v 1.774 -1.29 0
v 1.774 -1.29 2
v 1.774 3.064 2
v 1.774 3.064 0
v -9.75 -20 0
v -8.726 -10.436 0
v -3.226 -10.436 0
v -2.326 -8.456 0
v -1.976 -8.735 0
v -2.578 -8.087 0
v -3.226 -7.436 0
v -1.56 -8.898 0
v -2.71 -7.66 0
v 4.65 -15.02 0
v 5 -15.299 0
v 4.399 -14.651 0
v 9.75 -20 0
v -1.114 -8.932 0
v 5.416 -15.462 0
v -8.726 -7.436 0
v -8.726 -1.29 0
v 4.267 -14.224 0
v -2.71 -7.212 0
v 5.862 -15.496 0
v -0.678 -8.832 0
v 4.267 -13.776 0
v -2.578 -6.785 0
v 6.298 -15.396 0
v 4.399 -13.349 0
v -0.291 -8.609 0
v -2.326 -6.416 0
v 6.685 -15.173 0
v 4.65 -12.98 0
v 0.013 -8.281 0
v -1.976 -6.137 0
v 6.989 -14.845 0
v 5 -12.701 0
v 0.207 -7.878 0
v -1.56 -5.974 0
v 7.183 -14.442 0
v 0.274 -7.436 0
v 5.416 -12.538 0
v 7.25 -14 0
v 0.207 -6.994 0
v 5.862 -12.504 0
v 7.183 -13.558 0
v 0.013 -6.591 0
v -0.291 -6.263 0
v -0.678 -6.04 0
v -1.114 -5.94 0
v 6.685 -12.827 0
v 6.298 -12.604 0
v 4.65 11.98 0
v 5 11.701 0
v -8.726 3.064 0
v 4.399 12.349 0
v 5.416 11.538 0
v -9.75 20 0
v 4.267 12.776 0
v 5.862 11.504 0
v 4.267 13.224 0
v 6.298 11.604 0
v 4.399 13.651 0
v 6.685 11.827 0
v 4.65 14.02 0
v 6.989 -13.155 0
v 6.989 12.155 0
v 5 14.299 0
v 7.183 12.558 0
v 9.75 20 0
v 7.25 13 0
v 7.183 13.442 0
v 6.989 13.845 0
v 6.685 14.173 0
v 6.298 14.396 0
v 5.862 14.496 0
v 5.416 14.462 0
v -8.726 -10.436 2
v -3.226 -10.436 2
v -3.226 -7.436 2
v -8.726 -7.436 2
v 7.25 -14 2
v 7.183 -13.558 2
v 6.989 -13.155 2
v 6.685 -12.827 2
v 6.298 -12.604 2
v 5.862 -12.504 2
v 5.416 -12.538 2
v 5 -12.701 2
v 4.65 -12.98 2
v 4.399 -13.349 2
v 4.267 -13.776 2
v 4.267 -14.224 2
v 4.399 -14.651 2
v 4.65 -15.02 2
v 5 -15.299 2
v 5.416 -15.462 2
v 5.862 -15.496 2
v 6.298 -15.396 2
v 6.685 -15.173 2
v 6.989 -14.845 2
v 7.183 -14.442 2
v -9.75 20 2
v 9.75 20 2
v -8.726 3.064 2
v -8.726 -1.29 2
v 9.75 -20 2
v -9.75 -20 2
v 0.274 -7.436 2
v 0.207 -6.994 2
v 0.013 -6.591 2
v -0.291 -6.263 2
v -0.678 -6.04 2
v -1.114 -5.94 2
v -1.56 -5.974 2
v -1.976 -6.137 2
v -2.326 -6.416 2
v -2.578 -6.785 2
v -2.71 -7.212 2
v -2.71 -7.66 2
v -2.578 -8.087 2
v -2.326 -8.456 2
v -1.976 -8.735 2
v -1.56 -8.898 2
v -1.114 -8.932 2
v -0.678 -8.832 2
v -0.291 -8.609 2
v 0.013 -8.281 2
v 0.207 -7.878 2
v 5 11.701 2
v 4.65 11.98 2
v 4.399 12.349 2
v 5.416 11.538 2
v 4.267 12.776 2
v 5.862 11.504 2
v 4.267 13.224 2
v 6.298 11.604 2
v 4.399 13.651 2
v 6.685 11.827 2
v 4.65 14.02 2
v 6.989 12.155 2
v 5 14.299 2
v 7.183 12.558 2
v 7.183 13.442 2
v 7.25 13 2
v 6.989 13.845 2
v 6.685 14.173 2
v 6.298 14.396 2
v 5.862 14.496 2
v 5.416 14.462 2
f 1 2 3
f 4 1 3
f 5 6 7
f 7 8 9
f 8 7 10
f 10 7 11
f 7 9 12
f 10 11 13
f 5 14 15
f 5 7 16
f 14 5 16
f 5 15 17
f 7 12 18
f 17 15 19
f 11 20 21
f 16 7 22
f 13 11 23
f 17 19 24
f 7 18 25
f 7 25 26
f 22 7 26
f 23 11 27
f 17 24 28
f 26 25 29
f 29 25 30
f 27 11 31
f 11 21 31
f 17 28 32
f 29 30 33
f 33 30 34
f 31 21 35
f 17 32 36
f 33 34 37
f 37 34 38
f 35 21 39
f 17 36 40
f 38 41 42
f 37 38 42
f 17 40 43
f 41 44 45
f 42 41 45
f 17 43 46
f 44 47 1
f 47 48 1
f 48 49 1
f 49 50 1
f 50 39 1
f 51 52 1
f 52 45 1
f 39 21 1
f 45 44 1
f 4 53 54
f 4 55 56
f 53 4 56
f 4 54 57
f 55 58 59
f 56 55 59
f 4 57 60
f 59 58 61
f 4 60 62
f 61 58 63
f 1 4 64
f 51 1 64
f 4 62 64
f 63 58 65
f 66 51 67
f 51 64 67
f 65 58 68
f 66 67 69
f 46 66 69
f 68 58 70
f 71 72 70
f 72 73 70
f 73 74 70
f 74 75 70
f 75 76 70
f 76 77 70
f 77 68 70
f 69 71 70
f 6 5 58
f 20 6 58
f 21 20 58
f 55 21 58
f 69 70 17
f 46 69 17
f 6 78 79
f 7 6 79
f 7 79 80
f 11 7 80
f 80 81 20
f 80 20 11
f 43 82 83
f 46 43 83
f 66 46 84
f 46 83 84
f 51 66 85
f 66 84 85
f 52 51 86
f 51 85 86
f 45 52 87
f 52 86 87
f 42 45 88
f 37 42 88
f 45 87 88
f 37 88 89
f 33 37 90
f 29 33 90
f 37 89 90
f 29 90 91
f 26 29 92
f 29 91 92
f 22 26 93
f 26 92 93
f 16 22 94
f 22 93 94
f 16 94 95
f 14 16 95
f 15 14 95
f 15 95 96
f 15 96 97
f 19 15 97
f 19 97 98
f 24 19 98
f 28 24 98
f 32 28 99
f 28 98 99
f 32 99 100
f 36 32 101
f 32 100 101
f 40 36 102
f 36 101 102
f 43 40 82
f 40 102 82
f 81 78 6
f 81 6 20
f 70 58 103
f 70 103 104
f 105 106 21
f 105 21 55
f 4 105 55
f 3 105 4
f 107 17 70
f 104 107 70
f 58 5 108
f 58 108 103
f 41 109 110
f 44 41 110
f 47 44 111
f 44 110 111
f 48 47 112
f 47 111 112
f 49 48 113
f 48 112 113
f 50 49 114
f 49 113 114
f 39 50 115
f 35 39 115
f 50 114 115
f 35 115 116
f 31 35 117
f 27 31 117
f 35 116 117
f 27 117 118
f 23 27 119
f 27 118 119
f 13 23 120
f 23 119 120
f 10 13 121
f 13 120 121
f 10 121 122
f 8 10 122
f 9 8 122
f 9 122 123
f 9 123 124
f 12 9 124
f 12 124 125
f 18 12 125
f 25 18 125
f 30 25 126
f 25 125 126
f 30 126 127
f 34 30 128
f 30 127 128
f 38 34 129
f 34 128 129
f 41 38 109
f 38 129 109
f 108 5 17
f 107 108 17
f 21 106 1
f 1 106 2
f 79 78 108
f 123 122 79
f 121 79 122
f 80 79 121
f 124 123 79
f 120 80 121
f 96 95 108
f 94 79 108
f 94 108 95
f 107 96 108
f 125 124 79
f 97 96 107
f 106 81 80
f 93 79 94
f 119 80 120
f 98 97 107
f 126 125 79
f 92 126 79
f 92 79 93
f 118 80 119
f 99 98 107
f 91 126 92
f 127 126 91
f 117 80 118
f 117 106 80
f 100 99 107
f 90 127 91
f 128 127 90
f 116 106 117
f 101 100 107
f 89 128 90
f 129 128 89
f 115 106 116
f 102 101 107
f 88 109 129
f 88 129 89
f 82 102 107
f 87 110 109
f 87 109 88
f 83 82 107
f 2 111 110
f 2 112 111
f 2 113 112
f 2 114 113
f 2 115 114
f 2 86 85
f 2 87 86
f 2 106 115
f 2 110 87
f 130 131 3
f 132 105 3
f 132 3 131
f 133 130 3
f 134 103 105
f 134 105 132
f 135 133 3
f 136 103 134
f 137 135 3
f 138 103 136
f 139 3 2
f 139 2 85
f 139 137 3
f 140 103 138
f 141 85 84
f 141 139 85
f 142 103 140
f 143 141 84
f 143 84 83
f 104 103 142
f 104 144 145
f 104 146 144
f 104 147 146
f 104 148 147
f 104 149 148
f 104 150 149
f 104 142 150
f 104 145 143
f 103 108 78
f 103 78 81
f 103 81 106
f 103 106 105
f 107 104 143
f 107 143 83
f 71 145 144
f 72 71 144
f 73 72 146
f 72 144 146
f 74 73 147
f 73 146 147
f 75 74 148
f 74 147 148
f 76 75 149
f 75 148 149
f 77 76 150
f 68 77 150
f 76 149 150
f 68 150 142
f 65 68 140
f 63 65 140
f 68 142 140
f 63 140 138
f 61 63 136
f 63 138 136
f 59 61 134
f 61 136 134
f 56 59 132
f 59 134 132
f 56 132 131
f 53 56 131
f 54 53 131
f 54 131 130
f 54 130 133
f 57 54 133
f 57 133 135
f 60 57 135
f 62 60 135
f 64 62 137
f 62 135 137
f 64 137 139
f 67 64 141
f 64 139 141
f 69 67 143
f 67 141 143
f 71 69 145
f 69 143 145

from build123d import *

# Parameters (mm, degrees)
SKETCH1_W           = 19.5
SKETCH1_H           = 40
BOSS_EXTRUDE1_DEPTH = 2
SKETCH2_R           = 1.5
SKETCH2_W           = 5.5
SKETCH2_H           = 3
SKETCH2_W_2         = 10.5
SKETCH2_H_2         = 4.353558907
CUT_EXTRUDE1_DEPTH  = 2
SKETCH3_R           = 1.5
CUT_EXTRUDE2_DEPTH  = 2


with BuildPart() as part:
    # Sketch1 → Boss-Extrude1 (new body)
    with BuildSketch(Plane.XY):
        Rectangle(SKETCH1_W, SKETCH1_H)
    extrude(amount=BOSS_EXTRUDE1_DEPTH)

    # Sketch2 → Cut-Extrude1 (cut)
    with BuildSketch(Plane.XY.offset(2)):
        with Locations((-1.226480499, -7.435998593)):
            Circle(SKETCH2_R)
        with Locations((-5.976480499, -8.935998593)):
            Rectangle(SKETCH2_W, SKETCH2_H)
        with Locations((-3.476480499, 0.887221953)):
            Rectangle(SKETCH2_W_2, SKETCH2_H_2)
    extrude(amount=-CUT_EXTRUDE1_DEPTH, mode=Mode.SUBTRACT)

    # Sketch3 → Cut-Extrude2 (cut)
    with BuildSketch(Plane.XY.offset(2)):
        with Locations((5.75, -14)):
            Circle(SKETCH3_R)
        with Locations((5.75, 13)):
            Circle(SKETCH3_R)
    extrude(amount=-CUT_EXTRUDE2_DEPTH, mode=Mode.SUBTRACT)


solid = part.part
